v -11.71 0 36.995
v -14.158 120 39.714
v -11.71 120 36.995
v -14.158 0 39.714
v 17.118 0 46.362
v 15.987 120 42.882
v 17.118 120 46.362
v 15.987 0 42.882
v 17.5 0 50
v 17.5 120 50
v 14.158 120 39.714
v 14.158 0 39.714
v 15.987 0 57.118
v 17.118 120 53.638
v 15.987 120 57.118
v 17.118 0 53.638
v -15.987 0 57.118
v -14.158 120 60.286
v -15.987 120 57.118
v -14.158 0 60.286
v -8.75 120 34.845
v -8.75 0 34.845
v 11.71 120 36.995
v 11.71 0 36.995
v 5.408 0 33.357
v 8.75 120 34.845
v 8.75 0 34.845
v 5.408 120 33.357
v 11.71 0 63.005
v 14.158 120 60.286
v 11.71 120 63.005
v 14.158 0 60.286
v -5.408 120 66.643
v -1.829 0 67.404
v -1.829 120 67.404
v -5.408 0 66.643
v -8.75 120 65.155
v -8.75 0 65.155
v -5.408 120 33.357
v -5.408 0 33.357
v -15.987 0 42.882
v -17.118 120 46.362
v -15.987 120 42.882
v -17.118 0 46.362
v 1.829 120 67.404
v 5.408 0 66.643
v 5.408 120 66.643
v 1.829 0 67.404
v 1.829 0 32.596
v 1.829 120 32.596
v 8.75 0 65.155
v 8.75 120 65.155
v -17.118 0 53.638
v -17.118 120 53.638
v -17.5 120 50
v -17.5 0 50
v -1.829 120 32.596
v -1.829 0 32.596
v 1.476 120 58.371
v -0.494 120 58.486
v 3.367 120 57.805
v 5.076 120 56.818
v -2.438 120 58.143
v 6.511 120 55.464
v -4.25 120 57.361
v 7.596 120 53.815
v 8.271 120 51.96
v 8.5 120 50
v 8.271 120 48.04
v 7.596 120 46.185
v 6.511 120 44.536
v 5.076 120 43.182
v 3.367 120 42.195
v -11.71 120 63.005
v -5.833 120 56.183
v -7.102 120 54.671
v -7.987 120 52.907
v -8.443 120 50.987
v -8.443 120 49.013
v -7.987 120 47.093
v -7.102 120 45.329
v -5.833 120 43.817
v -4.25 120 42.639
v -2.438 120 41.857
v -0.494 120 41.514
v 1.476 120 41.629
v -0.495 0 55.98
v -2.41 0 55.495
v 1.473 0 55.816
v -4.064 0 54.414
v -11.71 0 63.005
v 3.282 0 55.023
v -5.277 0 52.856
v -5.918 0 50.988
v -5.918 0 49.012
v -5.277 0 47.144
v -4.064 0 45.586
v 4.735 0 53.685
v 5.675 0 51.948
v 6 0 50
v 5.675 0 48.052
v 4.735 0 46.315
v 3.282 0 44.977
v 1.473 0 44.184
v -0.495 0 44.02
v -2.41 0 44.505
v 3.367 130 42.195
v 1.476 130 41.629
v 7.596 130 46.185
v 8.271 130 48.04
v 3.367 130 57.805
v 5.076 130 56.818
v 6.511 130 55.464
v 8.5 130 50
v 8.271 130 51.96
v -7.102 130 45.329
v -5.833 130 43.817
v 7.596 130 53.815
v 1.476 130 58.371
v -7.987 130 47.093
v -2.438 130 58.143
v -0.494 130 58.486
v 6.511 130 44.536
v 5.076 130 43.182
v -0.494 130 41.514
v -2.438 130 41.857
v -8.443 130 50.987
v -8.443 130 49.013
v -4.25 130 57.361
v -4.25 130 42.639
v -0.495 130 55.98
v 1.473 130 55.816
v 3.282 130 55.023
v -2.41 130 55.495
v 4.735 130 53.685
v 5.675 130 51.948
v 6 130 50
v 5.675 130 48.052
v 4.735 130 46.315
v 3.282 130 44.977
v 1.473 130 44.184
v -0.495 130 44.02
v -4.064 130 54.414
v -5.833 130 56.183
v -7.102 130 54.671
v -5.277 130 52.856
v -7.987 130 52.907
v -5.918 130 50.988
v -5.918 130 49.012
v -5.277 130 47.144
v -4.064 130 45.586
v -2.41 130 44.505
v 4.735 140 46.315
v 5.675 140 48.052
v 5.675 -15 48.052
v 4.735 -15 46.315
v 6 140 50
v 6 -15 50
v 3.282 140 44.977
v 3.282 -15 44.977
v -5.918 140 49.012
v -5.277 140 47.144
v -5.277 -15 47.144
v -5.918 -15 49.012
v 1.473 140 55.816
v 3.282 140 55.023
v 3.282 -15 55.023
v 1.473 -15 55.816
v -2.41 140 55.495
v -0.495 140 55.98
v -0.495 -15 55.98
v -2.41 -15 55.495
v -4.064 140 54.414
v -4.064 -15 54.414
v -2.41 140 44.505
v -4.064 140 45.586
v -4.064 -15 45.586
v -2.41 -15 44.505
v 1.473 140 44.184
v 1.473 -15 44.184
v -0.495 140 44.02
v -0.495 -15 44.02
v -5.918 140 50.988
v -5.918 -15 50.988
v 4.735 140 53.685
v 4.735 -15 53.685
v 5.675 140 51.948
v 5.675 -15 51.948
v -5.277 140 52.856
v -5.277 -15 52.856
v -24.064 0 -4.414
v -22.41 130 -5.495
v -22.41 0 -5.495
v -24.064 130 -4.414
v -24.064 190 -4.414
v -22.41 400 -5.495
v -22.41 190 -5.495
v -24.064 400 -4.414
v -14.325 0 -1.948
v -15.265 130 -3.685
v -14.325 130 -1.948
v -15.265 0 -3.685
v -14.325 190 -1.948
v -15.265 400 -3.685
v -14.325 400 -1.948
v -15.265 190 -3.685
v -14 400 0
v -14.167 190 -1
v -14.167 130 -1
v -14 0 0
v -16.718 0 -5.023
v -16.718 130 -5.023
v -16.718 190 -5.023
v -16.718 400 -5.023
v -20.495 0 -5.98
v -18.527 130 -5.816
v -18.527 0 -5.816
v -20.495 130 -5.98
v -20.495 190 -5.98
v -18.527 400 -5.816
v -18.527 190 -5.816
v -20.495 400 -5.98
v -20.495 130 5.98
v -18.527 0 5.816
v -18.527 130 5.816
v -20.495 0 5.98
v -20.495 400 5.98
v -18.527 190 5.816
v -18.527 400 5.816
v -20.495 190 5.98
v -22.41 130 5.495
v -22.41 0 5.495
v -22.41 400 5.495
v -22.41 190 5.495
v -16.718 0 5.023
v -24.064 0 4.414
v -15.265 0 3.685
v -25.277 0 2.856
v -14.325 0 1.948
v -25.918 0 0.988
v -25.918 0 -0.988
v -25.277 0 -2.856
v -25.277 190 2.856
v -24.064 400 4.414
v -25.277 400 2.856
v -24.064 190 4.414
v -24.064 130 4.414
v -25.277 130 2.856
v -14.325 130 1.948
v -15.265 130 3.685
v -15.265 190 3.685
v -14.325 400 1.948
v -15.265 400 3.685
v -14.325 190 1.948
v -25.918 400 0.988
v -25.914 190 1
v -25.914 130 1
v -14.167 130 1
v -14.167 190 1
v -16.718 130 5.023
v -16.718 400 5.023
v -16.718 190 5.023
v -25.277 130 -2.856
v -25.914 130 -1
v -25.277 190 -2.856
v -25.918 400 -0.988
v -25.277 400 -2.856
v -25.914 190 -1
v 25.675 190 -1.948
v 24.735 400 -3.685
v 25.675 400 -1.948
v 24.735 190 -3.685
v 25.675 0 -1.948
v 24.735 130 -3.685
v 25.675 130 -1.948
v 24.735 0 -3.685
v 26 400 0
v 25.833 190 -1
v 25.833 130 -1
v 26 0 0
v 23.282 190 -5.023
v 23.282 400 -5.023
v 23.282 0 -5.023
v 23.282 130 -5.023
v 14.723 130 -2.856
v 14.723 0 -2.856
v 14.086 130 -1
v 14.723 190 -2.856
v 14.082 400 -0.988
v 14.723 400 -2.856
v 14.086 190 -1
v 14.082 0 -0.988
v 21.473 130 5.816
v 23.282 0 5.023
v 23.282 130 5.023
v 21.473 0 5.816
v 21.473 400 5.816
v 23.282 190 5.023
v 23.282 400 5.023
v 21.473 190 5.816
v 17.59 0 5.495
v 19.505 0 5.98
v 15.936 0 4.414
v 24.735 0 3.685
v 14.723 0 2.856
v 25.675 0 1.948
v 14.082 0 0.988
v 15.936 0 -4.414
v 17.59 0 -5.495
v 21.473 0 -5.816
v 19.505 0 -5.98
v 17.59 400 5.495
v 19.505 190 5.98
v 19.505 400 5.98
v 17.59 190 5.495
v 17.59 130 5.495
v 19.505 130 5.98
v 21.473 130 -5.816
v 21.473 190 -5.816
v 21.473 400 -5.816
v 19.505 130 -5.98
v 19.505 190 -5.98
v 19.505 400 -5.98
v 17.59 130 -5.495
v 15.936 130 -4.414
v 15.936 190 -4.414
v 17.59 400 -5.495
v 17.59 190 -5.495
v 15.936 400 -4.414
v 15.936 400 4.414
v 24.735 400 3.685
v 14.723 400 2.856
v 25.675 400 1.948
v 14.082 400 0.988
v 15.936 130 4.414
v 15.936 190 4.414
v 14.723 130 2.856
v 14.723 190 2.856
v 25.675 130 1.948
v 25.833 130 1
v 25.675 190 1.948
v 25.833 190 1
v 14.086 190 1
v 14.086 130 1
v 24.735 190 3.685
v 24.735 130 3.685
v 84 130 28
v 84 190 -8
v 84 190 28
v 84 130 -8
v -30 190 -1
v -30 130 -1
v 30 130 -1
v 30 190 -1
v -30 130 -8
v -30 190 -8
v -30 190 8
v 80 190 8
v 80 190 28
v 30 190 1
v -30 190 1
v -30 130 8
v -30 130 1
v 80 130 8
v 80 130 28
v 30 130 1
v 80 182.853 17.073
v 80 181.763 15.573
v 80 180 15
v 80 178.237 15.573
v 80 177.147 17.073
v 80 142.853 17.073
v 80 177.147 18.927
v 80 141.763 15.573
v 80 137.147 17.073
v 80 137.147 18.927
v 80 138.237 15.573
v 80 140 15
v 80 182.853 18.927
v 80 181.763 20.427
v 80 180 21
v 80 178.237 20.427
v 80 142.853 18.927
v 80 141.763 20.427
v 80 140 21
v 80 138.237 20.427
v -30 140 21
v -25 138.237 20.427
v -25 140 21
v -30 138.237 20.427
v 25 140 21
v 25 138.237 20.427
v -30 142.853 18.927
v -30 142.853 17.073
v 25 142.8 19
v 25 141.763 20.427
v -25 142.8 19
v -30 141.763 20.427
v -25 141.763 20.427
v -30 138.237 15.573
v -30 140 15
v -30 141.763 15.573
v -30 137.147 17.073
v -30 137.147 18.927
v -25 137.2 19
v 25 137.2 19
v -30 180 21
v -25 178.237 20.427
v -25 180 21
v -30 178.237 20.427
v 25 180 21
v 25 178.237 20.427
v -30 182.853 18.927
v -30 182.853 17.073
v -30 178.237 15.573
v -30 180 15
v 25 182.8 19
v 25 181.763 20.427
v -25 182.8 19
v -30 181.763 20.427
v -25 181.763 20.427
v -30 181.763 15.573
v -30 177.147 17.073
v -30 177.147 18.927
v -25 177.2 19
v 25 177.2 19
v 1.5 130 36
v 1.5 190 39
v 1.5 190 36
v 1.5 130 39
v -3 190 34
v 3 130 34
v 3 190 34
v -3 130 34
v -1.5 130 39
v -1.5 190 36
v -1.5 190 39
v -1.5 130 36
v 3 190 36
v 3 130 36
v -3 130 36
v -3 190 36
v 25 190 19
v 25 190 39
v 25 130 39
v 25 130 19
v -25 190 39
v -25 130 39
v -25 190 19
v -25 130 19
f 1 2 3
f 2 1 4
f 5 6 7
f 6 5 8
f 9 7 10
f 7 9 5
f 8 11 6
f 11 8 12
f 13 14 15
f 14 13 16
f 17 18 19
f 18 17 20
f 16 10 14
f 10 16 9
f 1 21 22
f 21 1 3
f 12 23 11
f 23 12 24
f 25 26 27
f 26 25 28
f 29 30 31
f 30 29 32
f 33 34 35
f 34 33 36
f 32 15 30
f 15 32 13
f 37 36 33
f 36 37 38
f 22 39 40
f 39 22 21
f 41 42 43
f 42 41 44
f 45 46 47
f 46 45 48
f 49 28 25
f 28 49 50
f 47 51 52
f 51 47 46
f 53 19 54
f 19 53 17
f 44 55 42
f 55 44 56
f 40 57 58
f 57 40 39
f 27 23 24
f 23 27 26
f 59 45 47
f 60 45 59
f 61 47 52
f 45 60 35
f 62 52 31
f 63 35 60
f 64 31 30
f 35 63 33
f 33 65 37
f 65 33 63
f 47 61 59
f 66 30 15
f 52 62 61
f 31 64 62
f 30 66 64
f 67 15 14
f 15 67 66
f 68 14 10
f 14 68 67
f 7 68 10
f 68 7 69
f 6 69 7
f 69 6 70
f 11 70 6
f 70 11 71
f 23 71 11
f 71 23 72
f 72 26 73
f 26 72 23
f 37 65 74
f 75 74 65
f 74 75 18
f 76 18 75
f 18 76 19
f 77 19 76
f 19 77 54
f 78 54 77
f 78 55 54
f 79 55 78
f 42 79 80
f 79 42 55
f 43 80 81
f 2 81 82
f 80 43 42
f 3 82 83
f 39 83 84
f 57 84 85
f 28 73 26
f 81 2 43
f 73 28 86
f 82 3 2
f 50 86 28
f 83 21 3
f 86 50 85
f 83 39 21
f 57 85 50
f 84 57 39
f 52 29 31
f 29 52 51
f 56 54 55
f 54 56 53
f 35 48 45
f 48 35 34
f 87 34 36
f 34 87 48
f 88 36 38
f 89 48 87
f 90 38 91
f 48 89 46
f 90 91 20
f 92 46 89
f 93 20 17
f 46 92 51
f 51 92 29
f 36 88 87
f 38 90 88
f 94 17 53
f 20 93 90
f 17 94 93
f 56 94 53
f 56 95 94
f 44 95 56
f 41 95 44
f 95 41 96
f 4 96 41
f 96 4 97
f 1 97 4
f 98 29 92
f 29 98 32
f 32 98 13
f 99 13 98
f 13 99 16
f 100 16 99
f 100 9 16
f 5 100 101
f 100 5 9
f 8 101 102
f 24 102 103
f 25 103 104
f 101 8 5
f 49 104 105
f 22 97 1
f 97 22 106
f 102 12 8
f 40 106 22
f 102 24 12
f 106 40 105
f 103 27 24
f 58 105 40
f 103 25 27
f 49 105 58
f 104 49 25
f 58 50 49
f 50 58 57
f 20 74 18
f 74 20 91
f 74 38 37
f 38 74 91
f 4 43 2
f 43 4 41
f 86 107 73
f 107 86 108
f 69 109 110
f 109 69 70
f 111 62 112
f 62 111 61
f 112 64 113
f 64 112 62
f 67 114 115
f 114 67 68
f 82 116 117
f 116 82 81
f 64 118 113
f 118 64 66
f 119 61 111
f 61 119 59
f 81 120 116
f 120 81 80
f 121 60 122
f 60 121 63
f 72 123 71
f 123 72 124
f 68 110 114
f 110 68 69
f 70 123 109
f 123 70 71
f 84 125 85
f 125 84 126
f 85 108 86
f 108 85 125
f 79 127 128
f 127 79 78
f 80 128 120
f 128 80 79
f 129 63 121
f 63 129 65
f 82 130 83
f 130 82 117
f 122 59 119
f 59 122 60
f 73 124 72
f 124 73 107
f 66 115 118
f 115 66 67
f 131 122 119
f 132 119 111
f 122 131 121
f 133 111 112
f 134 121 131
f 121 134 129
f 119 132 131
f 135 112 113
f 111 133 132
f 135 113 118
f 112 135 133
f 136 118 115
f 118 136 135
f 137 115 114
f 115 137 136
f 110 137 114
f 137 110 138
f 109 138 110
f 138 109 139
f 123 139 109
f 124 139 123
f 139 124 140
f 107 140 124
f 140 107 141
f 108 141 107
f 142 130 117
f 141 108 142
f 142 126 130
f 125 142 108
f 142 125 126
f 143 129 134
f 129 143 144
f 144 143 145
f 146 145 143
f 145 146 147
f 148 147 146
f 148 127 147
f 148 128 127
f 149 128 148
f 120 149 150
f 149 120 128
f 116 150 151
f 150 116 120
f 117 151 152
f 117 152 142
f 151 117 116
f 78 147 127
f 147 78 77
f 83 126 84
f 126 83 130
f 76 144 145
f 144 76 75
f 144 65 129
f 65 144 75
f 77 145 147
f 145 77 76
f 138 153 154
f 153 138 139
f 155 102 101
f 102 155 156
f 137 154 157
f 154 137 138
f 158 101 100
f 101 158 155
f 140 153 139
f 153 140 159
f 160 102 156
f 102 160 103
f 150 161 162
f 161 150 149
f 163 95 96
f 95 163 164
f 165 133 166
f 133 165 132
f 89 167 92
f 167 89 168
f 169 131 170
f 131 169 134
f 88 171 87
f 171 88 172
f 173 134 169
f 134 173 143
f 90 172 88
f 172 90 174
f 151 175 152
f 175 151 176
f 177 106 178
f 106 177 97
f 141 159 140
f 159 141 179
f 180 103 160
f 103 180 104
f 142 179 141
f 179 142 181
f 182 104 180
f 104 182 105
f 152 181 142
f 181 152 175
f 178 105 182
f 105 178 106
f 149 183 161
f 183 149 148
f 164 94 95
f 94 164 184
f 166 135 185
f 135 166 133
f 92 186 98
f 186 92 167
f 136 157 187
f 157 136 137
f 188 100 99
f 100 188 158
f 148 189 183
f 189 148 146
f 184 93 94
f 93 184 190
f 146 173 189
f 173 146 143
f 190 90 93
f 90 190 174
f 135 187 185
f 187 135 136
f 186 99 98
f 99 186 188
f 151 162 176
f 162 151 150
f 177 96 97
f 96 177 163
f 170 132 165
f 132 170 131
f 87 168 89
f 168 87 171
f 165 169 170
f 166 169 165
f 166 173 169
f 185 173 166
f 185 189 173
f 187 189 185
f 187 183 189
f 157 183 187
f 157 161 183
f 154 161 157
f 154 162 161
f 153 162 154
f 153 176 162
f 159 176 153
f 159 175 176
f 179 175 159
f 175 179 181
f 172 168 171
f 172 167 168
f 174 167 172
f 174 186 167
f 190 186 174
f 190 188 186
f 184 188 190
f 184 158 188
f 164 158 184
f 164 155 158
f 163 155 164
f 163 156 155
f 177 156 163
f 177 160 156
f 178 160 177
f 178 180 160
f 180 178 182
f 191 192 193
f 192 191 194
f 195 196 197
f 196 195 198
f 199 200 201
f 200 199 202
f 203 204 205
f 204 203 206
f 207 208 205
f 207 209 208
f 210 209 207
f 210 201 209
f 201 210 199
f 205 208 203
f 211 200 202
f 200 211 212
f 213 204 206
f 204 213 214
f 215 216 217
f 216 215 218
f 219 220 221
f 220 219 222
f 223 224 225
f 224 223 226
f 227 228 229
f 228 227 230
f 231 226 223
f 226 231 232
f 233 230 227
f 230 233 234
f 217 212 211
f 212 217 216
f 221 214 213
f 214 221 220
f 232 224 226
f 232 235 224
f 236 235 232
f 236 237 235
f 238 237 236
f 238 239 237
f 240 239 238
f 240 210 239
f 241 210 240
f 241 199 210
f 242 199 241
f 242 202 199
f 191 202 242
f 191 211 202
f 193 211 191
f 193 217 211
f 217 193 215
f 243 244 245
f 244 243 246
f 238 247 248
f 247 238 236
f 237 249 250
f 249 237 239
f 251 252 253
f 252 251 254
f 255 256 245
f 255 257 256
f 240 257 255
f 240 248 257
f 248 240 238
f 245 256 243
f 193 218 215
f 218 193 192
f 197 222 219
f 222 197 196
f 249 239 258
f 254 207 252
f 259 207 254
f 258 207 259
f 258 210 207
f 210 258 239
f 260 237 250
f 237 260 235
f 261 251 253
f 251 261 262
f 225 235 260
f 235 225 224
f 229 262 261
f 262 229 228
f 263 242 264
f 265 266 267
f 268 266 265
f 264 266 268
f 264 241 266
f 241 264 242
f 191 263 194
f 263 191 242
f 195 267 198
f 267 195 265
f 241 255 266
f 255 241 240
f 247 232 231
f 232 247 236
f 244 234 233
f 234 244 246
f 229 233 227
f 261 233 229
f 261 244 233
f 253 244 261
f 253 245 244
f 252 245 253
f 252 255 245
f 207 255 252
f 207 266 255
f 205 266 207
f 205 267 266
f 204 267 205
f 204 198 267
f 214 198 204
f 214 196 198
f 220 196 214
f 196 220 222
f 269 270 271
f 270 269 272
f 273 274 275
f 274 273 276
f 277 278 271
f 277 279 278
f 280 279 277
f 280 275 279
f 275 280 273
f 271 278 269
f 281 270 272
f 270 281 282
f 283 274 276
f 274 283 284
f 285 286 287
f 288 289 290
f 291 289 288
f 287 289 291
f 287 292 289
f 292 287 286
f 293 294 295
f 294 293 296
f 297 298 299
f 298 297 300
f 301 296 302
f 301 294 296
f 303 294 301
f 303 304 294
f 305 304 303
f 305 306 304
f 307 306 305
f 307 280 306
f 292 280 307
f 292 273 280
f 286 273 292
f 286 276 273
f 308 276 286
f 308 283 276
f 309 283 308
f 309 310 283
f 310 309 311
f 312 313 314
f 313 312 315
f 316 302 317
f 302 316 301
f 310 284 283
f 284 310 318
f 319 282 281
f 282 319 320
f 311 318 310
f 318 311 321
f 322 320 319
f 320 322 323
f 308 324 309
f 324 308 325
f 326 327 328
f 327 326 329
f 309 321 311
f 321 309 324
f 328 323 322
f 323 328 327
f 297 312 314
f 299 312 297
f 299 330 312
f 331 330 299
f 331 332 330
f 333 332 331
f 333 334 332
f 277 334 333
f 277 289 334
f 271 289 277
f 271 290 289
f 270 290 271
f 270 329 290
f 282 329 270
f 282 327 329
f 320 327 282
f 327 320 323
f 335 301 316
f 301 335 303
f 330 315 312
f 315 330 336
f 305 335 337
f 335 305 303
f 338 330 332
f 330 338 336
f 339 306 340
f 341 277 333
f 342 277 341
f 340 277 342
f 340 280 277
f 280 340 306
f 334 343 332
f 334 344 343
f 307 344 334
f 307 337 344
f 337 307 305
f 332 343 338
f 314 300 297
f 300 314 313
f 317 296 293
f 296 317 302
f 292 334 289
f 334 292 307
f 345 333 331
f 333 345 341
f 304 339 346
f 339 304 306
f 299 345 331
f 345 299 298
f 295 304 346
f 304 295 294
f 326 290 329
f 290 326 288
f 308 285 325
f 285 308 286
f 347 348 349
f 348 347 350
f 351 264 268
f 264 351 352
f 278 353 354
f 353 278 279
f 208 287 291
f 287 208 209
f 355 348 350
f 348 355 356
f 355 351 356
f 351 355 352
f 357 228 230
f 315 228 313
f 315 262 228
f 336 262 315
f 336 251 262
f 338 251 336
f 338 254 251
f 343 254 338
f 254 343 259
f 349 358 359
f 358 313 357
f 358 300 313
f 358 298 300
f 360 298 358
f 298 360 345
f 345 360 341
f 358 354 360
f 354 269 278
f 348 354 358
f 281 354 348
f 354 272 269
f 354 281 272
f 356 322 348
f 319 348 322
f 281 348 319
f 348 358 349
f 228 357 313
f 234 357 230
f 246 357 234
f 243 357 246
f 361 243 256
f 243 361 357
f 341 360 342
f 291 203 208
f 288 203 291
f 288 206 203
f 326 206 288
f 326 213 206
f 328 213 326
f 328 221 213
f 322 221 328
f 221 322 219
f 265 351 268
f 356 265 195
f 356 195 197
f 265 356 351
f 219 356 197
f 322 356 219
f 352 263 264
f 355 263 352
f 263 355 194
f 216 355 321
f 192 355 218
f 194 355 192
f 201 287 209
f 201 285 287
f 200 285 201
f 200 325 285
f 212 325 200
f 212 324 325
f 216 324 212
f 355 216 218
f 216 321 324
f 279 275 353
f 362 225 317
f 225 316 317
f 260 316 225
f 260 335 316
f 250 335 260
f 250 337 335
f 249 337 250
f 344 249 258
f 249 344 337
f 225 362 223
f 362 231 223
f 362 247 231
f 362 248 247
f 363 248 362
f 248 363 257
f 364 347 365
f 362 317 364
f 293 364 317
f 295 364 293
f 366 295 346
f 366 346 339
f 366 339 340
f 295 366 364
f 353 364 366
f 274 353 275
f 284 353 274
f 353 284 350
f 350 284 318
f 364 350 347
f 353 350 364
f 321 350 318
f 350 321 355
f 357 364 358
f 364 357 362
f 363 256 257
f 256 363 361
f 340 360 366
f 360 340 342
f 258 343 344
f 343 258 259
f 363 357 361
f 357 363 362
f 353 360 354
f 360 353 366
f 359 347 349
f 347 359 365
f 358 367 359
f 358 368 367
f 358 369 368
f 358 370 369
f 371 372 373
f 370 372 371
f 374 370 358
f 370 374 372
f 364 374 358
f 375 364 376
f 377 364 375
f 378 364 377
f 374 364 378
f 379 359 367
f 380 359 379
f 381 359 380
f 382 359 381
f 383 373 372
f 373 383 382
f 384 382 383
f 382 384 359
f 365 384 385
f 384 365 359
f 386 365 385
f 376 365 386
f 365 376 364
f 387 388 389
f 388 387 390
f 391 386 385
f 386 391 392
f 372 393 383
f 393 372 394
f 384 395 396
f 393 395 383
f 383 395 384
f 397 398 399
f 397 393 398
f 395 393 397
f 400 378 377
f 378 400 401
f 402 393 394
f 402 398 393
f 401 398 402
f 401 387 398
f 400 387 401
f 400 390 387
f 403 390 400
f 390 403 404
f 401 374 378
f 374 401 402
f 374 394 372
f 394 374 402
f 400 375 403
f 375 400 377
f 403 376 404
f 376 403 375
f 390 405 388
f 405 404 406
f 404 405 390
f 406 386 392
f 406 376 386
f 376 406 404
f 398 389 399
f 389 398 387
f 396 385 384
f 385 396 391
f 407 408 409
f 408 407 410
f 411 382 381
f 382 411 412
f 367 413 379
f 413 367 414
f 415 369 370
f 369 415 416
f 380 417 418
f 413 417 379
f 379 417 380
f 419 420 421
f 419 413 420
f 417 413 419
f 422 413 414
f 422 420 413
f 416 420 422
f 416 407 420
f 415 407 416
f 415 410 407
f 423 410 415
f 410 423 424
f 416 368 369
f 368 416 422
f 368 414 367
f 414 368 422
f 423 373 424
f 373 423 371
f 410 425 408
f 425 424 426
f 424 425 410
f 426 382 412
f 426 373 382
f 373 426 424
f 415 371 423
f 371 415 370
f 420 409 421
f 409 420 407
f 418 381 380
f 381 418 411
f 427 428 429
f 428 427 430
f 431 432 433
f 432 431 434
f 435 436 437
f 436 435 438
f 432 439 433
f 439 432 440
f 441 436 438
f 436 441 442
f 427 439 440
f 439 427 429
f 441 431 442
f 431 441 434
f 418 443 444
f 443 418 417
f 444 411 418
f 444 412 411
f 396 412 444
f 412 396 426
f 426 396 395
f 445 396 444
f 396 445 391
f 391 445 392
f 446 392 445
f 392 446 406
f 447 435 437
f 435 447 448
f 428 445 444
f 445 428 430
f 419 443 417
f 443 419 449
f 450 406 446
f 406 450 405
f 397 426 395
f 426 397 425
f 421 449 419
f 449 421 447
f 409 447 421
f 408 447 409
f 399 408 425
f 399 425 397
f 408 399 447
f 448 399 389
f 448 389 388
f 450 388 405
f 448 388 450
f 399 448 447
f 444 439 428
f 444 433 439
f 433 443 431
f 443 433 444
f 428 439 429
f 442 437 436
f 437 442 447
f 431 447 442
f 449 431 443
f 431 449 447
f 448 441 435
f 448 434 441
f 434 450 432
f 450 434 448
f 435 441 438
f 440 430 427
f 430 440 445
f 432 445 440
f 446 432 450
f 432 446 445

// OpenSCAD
module spindle(spindle_diam = 35, spindle_len=120, 
    shoulder_diam=17, shoulder_len=10, 
    thread_diam=12, thread_len=10, 
    pulley_diam=12, pulley_len=15)
{
    color("red", 0.5)
    union()
    {
        rotate([ -90, 0, 0 ])
        cylinder(d=spindle_diam, h=spindle_len);

        rotate([ -90, 0, 0 ])
        cylinder(d=shoulder_diam, h=spindle_len+shoulder_len);
        
        rotate([ -90, 0, 0 ])
        cylinder(d=thread_diam, h=spindle_len+shoulder_len+thread_len);

        translate([ 0, -pulley_len, 0 ])
        rotate([ -90, 0, 0 ])
        cylinder(d=pulley_diam, h=spindle_len);
    }    
}
    
module bed(bars_len=400, bars_diam=12) 
{
    union()
    {
        translate([ -20, 0, 0 ])
        rotate([ -90, 0, 0 ])
        cylinder(d=bars_diam, h=bars_len);

        translate([ +20, 0, 0 ])
        rotate([ -90, 0, 0 ])
        cylinder(d=bars_diam, h=bars_len);
    }
    
}

module carriage(w=60, h=28)
{
    x0 = -30;
    x1 = +30;
    x2 = +80;
    x3 = +84;
    
    z1 = 1;
    z2 = 8;
    z3 = 28;
    
    y_bars = w/3;
    bars_len = x3-x0;
    bars_diam = 6;
    
    color("blue", 0.5)
    union()
    {
        translate ([ 0, -w/2, 0 ])
        union()
        {
            translate([ x0, 0, -z2 ])
            cube([ x3-x0, w, z2-z1 ]);

            translate([ x0, 0, z1 ])
            cube([ x3-x0, w, z2-z1 ]);

            translate([ x1, 0, -z2 ])
            cube([ x3-x1, w, 2*z2 ]);

            translate([ x2, 0, -z2 ])
            cube([ x3-x2, w, z3+z2 ]);
        }
        
        translate([ x0, -y_bars, (z2+z3)/2 ])
        rotate([ 0, 90, 0 ])
        cylinder(d=bars_diam, h=bars_len);

        translate([ x0, +y_bars, (z2+z3)/2 ])
        rotate([ 0, 90, 0 ])
        cylinder(d=bars_diam, h=bars_len);
    }   
}

module cross_slide(l=50, w=60, h=20)
{   
    eps = 1;
    
    t_slot_depth = 5;
    t_slot_height = 2;
    t_slot_wide = 6;
    t_slot_narrow = 3;
    
    color("green", 0.5)
    translate ([ 0, -w/2, 0 ])
    difference()
    {
        translate ([ -l/2, 0, -h ])
        cube([ l, w, h ]);

        union()
        {
            translate ([ -t_slot_narrow/2, -eps, -t_slot_depth ])
            cube([ t_slot_narrow, w+2*eps, t_slot_depth+eps ]);

            translate ([ -t_slot_wide/2, -eps, -t_slot_depth ])
            cube([ t_slot_wide, w+2+eps, t_slot_height ]);
        }   
    }   
}


module lathe(carriage_pos = 160, cross_slide_pos = 0)
{
    height_spindle = 50;
    height_cross_slide = height_spindle - 11;
    
    union()
    {
        translate([ 0, 0, height_spindle ])
        spindle();

        bed();   
        // headstock();
        // tailstock_deadcenter();
        
        translate([ 0, carriage_pos, 0 ])
        union()
        {
            carriage();
            // carriage_attachment();
            
            translate([ cross_slide_pos, 0, height_cross_slide ])
            cross_slide();
            // tool_post();
        }
        
    }
}

// lathe();

module lathe_top_view()
{
    projection()
    lathe();
}

module lathe_end_view()
{
    projection()
    rotate([ 90, 0, 0])
    lathe();
}

module lathe_front_view()
{
    projection()
    rotate([ 0, -90, 0])
    lathe();
}

lathe();
// lathe_front_view();
// lathe_top_view();
// lathe_end_view();
